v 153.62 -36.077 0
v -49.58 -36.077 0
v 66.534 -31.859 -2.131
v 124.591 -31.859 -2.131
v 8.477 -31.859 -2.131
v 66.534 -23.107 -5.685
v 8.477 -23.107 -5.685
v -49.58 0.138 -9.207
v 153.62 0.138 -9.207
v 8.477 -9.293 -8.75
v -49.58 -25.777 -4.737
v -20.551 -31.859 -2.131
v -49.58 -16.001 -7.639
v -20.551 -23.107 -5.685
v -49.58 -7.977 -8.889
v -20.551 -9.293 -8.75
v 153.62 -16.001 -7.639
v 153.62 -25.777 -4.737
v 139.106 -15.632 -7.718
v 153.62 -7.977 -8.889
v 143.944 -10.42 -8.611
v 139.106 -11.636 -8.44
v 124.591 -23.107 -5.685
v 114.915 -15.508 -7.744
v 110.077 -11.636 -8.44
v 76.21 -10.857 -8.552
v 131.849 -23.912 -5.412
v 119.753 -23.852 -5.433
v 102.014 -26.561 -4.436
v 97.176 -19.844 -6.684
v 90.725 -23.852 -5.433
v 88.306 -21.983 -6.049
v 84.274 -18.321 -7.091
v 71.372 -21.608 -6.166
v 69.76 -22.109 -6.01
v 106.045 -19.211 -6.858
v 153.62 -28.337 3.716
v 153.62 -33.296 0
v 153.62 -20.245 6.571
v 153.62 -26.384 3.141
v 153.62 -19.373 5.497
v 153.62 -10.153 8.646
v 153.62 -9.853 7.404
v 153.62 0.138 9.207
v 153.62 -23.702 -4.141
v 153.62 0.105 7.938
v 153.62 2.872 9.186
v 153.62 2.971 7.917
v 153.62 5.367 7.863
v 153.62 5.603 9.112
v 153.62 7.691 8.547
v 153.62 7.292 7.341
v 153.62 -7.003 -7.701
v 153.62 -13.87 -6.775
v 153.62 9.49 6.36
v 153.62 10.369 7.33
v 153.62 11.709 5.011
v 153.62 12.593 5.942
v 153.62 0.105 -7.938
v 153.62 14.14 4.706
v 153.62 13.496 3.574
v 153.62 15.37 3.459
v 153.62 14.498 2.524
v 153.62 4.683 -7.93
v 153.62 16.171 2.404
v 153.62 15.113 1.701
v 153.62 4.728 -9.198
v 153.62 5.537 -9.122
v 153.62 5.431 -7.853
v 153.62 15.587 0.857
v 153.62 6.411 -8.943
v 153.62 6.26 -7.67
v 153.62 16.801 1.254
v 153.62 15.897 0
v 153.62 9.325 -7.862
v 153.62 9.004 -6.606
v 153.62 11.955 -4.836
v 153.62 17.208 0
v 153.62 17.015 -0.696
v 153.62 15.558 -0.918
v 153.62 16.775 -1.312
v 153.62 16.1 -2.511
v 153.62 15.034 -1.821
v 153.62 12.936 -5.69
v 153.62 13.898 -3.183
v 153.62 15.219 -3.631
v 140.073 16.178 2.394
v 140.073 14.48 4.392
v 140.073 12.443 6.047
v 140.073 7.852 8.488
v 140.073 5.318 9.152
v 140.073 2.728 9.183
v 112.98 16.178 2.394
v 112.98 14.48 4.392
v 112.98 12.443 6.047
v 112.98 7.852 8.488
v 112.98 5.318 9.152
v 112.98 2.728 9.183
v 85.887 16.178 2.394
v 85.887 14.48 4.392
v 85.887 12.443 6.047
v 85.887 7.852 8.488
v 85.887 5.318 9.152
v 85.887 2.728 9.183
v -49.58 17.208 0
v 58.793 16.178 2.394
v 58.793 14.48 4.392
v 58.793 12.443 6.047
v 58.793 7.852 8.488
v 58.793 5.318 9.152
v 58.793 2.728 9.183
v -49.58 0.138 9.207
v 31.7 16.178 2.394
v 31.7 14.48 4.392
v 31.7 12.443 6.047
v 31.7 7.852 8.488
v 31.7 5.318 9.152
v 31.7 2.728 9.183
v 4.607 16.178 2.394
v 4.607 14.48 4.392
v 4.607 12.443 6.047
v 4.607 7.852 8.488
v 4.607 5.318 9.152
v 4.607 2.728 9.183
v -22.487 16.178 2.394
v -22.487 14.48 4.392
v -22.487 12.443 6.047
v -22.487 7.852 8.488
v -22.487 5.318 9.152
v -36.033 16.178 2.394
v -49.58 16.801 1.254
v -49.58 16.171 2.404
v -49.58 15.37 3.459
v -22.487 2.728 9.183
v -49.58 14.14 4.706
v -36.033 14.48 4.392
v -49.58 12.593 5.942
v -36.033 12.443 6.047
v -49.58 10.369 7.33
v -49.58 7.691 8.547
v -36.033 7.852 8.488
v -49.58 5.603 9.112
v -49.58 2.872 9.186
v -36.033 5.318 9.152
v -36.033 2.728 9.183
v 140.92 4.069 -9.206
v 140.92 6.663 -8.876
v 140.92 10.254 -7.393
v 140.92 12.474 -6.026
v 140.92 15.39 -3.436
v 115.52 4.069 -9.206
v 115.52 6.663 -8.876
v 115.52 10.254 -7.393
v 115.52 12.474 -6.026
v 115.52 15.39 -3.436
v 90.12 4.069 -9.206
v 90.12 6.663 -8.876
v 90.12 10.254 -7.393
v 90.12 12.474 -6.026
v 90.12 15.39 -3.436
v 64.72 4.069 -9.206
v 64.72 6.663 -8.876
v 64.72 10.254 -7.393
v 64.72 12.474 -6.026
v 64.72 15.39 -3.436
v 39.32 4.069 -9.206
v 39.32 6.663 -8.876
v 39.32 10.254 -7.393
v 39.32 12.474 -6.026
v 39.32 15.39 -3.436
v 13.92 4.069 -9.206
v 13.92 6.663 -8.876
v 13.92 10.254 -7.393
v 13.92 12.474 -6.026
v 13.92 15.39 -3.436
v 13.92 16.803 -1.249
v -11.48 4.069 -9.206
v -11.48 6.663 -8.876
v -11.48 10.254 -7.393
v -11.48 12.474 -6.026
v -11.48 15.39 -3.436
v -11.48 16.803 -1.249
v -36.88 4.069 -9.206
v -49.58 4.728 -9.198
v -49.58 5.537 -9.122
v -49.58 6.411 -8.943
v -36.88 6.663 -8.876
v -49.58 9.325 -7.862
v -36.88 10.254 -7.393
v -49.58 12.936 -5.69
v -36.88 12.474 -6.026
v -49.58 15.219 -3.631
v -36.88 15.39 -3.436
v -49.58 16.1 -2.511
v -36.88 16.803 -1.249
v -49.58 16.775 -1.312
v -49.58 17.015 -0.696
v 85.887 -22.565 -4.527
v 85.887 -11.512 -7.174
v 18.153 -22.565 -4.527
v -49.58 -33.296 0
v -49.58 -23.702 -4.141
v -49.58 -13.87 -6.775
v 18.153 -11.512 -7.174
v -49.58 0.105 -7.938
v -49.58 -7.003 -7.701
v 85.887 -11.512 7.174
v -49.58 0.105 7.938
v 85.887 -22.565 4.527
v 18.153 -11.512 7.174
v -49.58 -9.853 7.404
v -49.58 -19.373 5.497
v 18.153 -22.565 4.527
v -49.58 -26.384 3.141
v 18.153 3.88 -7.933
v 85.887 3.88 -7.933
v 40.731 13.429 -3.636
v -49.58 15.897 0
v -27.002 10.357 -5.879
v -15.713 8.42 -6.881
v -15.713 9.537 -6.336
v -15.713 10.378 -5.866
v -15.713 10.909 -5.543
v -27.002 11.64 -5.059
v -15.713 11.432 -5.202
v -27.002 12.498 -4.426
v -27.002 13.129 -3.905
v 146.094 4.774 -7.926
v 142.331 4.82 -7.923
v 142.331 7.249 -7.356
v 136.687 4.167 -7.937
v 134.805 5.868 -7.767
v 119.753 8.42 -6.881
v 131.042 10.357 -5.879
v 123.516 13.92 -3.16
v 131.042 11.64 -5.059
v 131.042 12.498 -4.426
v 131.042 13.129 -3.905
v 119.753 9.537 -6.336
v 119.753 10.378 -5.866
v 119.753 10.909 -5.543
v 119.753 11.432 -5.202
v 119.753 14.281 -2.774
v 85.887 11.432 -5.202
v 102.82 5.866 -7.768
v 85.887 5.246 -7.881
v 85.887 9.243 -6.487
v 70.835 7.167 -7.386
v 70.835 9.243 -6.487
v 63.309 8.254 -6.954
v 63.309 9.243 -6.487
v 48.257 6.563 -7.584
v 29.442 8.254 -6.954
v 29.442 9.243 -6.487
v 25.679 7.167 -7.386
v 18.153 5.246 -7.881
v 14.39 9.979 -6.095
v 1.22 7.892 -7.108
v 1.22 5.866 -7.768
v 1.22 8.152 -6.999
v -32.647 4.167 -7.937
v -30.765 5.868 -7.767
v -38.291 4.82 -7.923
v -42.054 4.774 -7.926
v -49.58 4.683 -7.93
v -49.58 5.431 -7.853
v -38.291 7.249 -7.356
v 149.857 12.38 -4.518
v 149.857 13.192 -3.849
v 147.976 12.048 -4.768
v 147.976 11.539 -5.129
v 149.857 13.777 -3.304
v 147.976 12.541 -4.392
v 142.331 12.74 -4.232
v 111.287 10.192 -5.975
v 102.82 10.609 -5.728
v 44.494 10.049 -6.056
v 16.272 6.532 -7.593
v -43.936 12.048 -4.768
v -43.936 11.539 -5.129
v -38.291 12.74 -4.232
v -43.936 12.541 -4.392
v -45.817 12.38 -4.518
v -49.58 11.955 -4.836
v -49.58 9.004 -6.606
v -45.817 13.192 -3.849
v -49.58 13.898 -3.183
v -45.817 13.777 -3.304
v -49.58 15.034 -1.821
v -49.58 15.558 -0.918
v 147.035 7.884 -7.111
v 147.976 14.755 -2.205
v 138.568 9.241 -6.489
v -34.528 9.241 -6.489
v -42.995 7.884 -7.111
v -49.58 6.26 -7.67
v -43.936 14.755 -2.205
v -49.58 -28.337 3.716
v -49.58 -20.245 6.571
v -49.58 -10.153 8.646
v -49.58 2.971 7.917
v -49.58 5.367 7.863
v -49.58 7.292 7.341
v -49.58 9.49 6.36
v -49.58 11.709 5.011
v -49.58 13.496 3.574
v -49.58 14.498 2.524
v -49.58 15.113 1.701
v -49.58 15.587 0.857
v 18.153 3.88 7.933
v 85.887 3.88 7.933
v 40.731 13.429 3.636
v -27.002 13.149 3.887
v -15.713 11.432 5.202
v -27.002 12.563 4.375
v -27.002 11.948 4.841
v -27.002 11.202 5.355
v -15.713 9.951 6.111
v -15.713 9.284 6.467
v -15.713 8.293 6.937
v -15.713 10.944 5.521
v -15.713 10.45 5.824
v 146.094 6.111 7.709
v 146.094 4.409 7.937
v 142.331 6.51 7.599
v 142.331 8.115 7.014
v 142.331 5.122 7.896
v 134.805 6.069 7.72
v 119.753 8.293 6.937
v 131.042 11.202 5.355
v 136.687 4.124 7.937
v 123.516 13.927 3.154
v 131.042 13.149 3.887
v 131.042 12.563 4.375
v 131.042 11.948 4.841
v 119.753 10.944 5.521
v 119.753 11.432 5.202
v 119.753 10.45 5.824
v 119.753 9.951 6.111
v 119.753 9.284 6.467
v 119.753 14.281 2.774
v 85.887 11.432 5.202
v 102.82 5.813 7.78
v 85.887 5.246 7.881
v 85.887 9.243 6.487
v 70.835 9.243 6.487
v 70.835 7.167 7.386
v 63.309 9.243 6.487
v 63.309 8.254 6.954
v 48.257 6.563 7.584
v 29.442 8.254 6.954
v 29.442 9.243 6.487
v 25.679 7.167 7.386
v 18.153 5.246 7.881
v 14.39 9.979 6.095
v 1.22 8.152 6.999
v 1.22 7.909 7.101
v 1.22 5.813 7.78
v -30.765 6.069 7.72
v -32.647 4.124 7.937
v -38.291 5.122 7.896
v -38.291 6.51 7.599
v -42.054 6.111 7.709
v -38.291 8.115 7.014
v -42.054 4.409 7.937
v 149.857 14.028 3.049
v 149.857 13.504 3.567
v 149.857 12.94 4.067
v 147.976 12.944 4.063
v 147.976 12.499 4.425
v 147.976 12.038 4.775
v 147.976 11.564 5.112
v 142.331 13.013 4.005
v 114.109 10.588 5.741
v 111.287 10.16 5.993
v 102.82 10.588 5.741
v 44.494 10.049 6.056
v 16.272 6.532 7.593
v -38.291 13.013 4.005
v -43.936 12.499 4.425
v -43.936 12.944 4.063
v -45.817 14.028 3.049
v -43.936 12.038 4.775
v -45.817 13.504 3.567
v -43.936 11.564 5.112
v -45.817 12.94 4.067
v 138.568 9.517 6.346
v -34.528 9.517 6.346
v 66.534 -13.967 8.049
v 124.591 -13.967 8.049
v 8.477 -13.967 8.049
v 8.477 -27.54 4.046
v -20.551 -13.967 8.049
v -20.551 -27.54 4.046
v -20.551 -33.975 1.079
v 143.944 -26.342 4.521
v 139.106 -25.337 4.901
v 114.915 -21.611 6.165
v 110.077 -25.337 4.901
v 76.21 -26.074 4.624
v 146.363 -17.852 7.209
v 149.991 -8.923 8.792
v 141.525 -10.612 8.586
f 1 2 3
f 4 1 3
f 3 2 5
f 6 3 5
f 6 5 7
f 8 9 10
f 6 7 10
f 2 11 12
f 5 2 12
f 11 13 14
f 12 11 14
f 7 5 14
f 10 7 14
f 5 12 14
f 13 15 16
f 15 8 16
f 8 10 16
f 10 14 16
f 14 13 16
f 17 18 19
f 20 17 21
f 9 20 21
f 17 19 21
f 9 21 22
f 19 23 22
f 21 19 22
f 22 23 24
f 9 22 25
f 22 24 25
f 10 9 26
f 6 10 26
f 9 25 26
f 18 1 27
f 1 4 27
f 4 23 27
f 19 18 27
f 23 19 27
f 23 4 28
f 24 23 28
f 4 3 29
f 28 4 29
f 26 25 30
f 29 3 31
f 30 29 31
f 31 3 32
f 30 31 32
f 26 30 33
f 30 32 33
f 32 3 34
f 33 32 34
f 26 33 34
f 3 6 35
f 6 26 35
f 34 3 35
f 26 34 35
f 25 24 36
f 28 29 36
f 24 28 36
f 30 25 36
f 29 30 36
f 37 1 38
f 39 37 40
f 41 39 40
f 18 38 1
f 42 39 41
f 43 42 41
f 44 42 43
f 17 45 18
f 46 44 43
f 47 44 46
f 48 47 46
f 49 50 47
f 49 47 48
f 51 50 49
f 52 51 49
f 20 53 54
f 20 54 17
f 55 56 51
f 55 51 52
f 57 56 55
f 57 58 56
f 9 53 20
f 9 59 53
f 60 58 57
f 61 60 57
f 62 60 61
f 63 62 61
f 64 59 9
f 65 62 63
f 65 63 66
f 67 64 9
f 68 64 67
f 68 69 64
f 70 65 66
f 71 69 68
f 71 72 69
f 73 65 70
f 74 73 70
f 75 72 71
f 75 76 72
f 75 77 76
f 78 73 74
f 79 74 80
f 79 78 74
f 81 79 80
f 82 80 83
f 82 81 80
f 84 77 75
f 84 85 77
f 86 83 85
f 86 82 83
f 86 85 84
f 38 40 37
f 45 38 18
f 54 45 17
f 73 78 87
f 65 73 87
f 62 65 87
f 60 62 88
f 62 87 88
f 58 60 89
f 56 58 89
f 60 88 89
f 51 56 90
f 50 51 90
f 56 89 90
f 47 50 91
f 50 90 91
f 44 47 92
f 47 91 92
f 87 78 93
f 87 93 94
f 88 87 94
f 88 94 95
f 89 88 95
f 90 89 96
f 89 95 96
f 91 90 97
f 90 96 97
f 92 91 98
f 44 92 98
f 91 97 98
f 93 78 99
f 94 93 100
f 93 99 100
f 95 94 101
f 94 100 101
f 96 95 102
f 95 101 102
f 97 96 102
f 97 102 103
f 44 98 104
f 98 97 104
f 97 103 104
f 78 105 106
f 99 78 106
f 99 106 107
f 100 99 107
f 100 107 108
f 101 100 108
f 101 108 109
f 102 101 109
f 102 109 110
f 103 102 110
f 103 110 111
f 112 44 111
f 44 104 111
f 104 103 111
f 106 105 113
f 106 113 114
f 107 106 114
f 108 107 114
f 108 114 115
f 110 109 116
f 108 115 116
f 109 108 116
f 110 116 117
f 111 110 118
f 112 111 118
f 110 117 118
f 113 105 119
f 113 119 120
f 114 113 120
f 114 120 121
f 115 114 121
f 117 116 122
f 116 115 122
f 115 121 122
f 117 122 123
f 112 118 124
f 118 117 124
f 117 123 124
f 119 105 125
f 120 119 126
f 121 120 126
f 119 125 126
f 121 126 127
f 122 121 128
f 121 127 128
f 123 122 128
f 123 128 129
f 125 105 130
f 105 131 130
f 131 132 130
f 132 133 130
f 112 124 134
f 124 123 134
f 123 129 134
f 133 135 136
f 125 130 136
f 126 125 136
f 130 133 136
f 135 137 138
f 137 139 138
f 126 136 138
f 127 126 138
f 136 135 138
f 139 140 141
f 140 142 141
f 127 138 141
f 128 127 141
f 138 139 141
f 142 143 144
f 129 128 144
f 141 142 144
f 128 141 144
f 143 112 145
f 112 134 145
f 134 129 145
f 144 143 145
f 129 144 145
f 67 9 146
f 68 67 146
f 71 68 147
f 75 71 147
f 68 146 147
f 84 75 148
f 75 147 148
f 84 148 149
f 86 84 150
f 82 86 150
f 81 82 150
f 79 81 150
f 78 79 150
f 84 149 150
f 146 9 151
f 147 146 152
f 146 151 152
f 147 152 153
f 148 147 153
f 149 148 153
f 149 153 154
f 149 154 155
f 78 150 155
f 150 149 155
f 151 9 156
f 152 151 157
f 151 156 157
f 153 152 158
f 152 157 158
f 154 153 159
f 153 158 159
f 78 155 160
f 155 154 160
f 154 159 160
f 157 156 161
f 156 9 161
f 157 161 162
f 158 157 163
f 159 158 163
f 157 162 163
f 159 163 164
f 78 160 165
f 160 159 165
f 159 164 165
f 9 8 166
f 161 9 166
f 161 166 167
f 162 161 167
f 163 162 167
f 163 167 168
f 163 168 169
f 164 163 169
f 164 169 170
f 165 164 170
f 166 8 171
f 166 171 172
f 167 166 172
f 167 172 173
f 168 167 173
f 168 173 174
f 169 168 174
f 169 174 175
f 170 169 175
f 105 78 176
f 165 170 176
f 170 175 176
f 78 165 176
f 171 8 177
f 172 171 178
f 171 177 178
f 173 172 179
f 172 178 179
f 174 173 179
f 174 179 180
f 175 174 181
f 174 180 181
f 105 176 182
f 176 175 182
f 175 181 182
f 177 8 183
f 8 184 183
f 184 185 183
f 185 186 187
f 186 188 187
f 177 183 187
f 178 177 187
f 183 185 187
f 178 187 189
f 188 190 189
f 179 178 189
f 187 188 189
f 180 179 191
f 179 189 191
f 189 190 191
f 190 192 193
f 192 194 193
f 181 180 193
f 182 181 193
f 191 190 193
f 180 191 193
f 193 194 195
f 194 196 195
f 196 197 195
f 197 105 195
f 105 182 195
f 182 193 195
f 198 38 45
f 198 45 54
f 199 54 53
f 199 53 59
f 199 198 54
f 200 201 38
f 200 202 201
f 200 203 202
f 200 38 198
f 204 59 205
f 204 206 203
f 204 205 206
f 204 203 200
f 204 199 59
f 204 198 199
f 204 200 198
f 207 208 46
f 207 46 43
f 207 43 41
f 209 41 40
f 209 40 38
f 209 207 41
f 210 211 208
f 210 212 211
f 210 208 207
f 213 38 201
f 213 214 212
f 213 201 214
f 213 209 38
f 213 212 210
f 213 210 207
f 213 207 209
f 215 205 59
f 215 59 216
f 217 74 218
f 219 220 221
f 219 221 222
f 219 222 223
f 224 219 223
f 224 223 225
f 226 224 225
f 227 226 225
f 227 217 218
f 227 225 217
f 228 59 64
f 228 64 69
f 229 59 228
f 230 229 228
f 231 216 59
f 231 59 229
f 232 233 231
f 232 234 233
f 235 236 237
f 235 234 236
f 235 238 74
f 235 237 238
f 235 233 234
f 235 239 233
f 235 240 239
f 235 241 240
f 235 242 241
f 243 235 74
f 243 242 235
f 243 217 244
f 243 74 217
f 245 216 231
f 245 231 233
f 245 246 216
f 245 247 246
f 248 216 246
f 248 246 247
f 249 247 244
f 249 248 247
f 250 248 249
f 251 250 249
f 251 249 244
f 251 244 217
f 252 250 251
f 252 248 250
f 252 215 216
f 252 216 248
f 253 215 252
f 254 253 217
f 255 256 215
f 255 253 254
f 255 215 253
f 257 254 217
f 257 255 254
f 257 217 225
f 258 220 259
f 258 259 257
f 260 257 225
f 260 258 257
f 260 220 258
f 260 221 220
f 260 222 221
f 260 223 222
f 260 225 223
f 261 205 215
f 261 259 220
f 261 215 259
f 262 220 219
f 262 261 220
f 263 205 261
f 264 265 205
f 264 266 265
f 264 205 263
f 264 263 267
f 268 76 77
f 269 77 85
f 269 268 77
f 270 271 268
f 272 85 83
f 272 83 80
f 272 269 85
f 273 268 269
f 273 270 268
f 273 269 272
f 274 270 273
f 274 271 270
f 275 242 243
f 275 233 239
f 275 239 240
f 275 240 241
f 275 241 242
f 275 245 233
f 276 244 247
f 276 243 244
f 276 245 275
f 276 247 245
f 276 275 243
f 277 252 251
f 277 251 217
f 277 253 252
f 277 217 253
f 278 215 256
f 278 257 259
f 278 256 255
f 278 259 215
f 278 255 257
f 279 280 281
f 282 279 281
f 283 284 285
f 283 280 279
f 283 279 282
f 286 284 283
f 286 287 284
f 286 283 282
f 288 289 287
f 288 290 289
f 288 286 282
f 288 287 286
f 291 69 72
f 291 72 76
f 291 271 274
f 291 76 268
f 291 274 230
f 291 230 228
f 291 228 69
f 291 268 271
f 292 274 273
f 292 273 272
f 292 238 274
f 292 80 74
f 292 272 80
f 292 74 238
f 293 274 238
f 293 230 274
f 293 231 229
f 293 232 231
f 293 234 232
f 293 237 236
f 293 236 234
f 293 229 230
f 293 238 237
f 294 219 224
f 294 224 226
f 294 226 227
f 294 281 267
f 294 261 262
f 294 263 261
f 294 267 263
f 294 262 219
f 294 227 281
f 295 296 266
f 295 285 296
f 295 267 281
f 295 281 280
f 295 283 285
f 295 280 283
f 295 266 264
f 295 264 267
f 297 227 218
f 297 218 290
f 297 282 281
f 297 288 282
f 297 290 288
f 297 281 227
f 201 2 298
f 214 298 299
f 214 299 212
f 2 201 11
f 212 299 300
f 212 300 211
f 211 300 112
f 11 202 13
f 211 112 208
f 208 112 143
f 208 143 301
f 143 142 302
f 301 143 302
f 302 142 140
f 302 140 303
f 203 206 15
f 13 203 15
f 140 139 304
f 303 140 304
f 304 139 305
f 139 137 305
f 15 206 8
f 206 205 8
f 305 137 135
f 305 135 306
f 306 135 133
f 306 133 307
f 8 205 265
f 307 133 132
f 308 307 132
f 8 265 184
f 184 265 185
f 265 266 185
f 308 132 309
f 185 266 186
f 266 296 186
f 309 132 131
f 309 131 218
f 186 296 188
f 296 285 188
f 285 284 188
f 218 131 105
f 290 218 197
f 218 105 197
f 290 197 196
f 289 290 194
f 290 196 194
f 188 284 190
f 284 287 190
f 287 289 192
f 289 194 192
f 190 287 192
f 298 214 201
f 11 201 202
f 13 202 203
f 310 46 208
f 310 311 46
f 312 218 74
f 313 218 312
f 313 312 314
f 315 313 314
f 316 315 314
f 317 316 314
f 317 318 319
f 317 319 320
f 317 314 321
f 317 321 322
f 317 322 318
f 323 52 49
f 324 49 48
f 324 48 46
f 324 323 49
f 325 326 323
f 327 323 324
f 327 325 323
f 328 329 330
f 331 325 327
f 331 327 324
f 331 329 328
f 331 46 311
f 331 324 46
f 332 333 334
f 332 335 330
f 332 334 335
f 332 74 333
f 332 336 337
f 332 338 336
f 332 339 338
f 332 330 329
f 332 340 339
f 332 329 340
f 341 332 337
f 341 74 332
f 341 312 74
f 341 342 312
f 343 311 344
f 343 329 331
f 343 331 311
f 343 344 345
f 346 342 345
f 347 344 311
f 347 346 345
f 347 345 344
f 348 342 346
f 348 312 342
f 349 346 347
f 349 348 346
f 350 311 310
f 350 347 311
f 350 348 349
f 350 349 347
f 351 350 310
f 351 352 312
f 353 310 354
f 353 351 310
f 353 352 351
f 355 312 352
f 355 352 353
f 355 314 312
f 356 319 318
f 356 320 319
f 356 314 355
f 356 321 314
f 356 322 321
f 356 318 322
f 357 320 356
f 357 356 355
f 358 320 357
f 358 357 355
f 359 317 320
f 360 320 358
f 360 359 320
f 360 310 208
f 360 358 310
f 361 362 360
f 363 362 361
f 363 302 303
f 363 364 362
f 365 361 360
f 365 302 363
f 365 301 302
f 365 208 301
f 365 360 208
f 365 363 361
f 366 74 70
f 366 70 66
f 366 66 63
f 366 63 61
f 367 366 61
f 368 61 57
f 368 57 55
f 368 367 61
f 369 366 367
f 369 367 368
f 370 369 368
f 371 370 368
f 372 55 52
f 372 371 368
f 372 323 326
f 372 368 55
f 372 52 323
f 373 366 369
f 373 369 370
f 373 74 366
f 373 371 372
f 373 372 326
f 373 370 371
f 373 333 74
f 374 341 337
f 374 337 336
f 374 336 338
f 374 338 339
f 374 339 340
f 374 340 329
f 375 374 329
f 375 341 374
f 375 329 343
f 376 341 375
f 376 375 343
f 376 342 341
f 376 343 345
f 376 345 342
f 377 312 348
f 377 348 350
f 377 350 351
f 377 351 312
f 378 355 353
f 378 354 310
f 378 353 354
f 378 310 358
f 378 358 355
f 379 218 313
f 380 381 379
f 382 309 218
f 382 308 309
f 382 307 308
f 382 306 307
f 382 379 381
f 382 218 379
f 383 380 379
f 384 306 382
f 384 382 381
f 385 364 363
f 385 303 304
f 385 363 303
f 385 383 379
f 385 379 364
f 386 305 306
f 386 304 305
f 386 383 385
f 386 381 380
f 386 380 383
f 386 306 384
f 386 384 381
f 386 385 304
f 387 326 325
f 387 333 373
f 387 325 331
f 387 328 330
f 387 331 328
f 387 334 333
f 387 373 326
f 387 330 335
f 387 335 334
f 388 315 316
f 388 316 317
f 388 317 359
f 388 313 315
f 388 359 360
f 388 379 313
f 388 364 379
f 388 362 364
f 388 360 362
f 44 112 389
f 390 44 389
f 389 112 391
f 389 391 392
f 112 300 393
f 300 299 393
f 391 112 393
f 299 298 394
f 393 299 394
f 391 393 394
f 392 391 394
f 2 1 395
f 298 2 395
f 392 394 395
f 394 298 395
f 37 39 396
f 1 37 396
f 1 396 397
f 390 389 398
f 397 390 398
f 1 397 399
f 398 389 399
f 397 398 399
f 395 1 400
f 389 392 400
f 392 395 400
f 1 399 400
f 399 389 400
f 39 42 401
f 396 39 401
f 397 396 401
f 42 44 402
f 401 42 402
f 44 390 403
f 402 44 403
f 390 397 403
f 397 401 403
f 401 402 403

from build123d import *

# Parameters (mm, degrees)
BOSS_EXTRUDE1_DEPTH      = 153.61996
BOSS_EXTRUDE1_DEPTH_BACK = 104.21574
SKETCH1_R                = 7.9375
SKETCH1_R_2              = 6.4643
EXTRUDE_THIN1_START      = -203.2
EXTRUDE_THIN1_DEPTH      = 203.2


# Read off the part's stored shape, not the designer's step: Extrude-Thin1
with BuildPart() as part:
    # Sketch1 → Boss-Extrude1 (new, two sides: drawn at the far end of the back side and taken through both)
    with BuildSketch(Plane(origin=(0, 0, 0), x_dir=(0, 0, -1), z_dir=(1, 0, 0)).offset(-BOSS_EXTRUDE1_DEPTH_BACK)):
        with Locations(Location((0, 0, 0), (0, 0, 270))):
            Circle(SKETCH1_R)
        with Locations(Location((0, 0, 0), (0, 0, 270))):
            Circle(SKETCH1_R_2, mode=Mode.SUBTRACT)
    extrude(amount=BOSS_EXTRUDE1_DEPTH + BOSS_EXTRUDE1_DEPTH_BACK)


with BuildPart() as body_2:
    # Extrude-Thin1 outline → Extrude-Thin1 (new body)
    with BuildSketch(Plane(origin=(153.619959862, 0, 0), x_dir=(0, 0, -1), z_dir=(1, 0, 0)).offset(EXTRUDE_THIN1_START)):
        with BuildLine():
            add(Edge.make_bspline(
                [(0, 17.207559546), (-0.213797016, 17.152862004), (-0.42880706, 17.100801803), (-0.845636753, 16.968003101), (-1.049002351, 16.890625775), (-1.646041309, 16.630103699), (-2.026757553, 16.418787844), (-2.577500677, 16.057610271), (-2.758298236, 15.929264249), (-3.108894312, 15.662943804), (-3.279121061, 15.524761589), (-3.776732023, 15.097272706), (-4.091162254, 14.795137978), (-4.692872976, 14.163982702), (-4.980096404, 13.834905644), (-5.531572182, 13.154003751), (-5.79630298, 12.801295822), (-6.549823619, 11.726851467), (-7.002537116, 10.985157901), (-7.81841744, 9.455950062), (-8.182458905, 8.668883339), (-8.640371405, 7.443177376), (-8.778488758, 7.025596822), (-9.009083778, 6.173827929), (-9.100109427, 5.746682632), (-9.20377314, 4.888320037), (-9.211792234, 4.456862798), (-9.198956322, 3.592448397), (-9.189105956, 3.160062893), (-9.172251023, 1.863565908), (-9.176084553, 1.000017435), (-9.207156149, 0.137883897)],
                knots=[0, 0, 0, 0, 0.03125, 0.03125, 0.0625, 0.0625, 0.125, 0.125, 0.15625, 0.15625, 0.1875, 0.1875, 0.25, 0.25, 0.3125, 0.3125, 0.375, 0.375, 0.5, 0.5, 0.625, 0.625, 0.6875, 0.6875, 0.75, 0.75, 0.8125, 0.8125, 0.875, 0.875, 1, 1, 1, 1], degree=3))
            add(Edge.make_bspline(
                [(-9.207156149, 0.137883897), (-9.254567879, -3.016061968), (-9.110594057, -6.162643619), (-8.569736414, -10.862643519), (-8.336275013, -12.419752076), (-7.761375356, -15.514560805), (-7.419573925, -17.053624435), (-6.234254823, -21.632621497), (-5.234488958, -24.618892113), (-3.451071682, -29.000286622), (-2.811540258, -30.439512737), (-1.79028171, -32.569146175), (-1.438672145, -33.273749518), (-0.719336072, -34.675359425), (-0.359668036, -35.376164378), (0, -36.076969332)],
                knots=[0, 0, 0, 0, 0.25, 0.25, 0.375, 0.375, 0.5, 0.5, 0.75, 0.75, 0.875, 0.875, 0.9375, 0.9375, 1, 1, 1, 1], degree=3))
            add(Edge.make_bspline(
                [(0, -36.076969332), (0.359723472, -35.376056363), (0.719446944, -34.675143394), (1.438893888, -33.273317456), (1.790565857, -32.568572444), (2.812063227, -30.438384557), (3.452048995, -28.998025839), (4.640936279, -26.076956924), (5.18815569, -24.600410118), (6.182841679, -21.613493253), (6.630656344, -20.101718647), (7.815624895, -15.522775449), (8.389928975, -12.426265441), (9.11075463, -6.160134365), (9.254567065, -3.016007792), (9.207156149, 0.137883897)],
                knots=[0, 0, 0, 0, 0.0625, 0.0625, 0.125, 0.125, 0.25, 0.25, 0.375, 0.375, 0.5, 0.5, 0.75, 0.75, 1, 1, 1, 1], degree=3))
            add(Edge.make_bspline(
                [(9.207156149, 0.137883897), (9.175689476, 1.0109795), (9.172233827, 1.884590619), (9.189718729, 3.195424485), (9.200223759, 3.632455178), (9.211783508, 4.50634264), (9.200702397, 4.942976061), (9.116060671, 5.596674351), (9.077545633, 5.814621094), (8.98673913, 6.242698466), (8.934293247, 6.453967929), (8.760718275, 7.081391667), (8.623619453, 7.491266508), (8.167045839, 8.703087673), (7.803203601, 9.487588343), (7.187490205, 10.636834402), (6.969553739, 11.016052248), (6.513571235, 11.757163338), (6.275223658, 12.119743306), (5.527228859, 13.18210628), (4.98589787, 13.857489095), (4.084483233, 14.801700924), (3.767120438, 15.10608301), (3.105568901, 15.673289405), (2.760825125, 15.937099293), (2.216615083, 16.294420145), (2.030666021, 16.407085609), (1.648130786, 16.617343262), (1.450611941, 16.715328905), (1.048088593, 16.891075907), (0.843382437, 16.968818509), (0.426225712, 17.101525866), (0.212641899, 17.153157527), (0, 17.207559546)],
                knots=[0, 0, 0, 0, 0.125, 0.125, 0.1875, 0.1875, 0.25, 0.25, 0.28125, 0.28125, 0.3125, 0.3125, 0.375, 0.375, 0.5, 0.5, 0.5625, 0.5625, 0.625, 0.625, 0.75, 0.75, 0.8125, 0.8125, 0.875, 0.875, 0.90625, 0.90625, 0.9375, 0.9375, 0.96875, 0.96875, 1, 1, 1, 1], degree=3))
        make_face()
        with BuildLine():
            add(Edge.make_bspline(
                [(-7.9375, 0.105464983), (-8.117600633, -11.875275839), (-5.466290217, -22.644593383), (0, -33.295535017)],
                knots=[0, 0, 0, 0, 1, 1, 1, 1], degree=3))
            add(Edge.make_bspline(
                [(0, 15.896655346), (-3.804147623, 14.923407312), (-7.989029069, 7.547083002), (-7.925930538, 3.33473819), (-7.884513847, 1.575654615), (-7.9375, 0.105464983)],
                knots=[0, 0, 0, 0, 0.663308265, 0.763308265, 1, 1, 1, 1], degree=3))
            add(Edge.make_bspline(
                [(7.9375, 0.105464983), (7.884513847, 1.575654615), (7.925930538, 3.33473819), (7.989029069, 7.547083002), (3.804147623, 14.923407312), (0, 15.896655346)],
                knots=[0, 0, 0, 0, 0.236691735, 0.336691735, 1, 1, 1, 1], degree=3))
            add(Edge.make_bspline(
                [(0, -33.295535017), (5.466290217, -22.644593383), (8.117600633, -11.875275839), (7.9375, 0.105464983)],
                knots=[0, 0, 0, 0, 1, 1, 1, 1], degree=3))
        make_face(mode=Mode.SUBTRACT)
    extrude(amount=EXTRUDE_THIN1_DEPTH)


solid = body_2.part
